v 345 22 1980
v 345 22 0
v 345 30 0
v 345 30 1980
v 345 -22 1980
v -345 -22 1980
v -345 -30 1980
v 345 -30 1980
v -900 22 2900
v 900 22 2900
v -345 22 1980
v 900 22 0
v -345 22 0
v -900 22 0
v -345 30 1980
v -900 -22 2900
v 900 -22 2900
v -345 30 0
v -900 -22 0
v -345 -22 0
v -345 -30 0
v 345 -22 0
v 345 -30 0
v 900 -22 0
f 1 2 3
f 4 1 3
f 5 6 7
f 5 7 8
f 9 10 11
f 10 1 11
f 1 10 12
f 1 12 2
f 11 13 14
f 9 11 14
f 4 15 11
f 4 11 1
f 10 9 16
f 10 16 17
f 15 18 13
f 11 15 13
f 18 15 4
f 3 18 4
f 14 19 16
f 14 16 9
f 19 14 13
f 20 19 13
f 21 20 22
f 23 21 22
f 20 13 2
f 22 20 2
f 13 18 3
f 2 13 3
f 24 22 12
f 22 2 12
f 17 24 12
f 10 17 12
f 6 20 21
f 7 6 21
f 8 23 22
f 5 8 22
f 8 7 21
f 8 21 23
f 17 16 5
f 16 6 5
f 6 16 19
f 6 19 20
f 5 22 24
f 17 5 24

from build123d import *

# Parameters (mm, degrees)
F0_W     = 555
F0_H     = 44
F0_W_2   = 690
F1_DEPTH = 2900
F0_H_2   = 8
F2_DEPTH = 1980


with BuildPart() as f1:
    # F0 (on Top) → F1 (new body)
    with BuildSketch(Plane.XY):
        with Locations((622.5, 0)):
            Rectangle(F0_W, F0_H)
        Rectangle(F0_W_2, F0_H)
        with Locations((-622.5, 0)):
            Rectangle(F0_W, F0_H)
    extrude(amount=F1_DEPTH)

    # F0 (on Top) → F2 (join)
    with BuildSketch(Plane.XY):
        with Locations((0, 26)):
            Rectangle(F0_W_2, F0_H_2)
        Rectangle(F0_W_2, F0_H)
        with Locations((0, -26)):
            Rectangle(F0_W_2, F0_H_2)
    extrude(amount=F2_DEPTH)


solid = f1.part
